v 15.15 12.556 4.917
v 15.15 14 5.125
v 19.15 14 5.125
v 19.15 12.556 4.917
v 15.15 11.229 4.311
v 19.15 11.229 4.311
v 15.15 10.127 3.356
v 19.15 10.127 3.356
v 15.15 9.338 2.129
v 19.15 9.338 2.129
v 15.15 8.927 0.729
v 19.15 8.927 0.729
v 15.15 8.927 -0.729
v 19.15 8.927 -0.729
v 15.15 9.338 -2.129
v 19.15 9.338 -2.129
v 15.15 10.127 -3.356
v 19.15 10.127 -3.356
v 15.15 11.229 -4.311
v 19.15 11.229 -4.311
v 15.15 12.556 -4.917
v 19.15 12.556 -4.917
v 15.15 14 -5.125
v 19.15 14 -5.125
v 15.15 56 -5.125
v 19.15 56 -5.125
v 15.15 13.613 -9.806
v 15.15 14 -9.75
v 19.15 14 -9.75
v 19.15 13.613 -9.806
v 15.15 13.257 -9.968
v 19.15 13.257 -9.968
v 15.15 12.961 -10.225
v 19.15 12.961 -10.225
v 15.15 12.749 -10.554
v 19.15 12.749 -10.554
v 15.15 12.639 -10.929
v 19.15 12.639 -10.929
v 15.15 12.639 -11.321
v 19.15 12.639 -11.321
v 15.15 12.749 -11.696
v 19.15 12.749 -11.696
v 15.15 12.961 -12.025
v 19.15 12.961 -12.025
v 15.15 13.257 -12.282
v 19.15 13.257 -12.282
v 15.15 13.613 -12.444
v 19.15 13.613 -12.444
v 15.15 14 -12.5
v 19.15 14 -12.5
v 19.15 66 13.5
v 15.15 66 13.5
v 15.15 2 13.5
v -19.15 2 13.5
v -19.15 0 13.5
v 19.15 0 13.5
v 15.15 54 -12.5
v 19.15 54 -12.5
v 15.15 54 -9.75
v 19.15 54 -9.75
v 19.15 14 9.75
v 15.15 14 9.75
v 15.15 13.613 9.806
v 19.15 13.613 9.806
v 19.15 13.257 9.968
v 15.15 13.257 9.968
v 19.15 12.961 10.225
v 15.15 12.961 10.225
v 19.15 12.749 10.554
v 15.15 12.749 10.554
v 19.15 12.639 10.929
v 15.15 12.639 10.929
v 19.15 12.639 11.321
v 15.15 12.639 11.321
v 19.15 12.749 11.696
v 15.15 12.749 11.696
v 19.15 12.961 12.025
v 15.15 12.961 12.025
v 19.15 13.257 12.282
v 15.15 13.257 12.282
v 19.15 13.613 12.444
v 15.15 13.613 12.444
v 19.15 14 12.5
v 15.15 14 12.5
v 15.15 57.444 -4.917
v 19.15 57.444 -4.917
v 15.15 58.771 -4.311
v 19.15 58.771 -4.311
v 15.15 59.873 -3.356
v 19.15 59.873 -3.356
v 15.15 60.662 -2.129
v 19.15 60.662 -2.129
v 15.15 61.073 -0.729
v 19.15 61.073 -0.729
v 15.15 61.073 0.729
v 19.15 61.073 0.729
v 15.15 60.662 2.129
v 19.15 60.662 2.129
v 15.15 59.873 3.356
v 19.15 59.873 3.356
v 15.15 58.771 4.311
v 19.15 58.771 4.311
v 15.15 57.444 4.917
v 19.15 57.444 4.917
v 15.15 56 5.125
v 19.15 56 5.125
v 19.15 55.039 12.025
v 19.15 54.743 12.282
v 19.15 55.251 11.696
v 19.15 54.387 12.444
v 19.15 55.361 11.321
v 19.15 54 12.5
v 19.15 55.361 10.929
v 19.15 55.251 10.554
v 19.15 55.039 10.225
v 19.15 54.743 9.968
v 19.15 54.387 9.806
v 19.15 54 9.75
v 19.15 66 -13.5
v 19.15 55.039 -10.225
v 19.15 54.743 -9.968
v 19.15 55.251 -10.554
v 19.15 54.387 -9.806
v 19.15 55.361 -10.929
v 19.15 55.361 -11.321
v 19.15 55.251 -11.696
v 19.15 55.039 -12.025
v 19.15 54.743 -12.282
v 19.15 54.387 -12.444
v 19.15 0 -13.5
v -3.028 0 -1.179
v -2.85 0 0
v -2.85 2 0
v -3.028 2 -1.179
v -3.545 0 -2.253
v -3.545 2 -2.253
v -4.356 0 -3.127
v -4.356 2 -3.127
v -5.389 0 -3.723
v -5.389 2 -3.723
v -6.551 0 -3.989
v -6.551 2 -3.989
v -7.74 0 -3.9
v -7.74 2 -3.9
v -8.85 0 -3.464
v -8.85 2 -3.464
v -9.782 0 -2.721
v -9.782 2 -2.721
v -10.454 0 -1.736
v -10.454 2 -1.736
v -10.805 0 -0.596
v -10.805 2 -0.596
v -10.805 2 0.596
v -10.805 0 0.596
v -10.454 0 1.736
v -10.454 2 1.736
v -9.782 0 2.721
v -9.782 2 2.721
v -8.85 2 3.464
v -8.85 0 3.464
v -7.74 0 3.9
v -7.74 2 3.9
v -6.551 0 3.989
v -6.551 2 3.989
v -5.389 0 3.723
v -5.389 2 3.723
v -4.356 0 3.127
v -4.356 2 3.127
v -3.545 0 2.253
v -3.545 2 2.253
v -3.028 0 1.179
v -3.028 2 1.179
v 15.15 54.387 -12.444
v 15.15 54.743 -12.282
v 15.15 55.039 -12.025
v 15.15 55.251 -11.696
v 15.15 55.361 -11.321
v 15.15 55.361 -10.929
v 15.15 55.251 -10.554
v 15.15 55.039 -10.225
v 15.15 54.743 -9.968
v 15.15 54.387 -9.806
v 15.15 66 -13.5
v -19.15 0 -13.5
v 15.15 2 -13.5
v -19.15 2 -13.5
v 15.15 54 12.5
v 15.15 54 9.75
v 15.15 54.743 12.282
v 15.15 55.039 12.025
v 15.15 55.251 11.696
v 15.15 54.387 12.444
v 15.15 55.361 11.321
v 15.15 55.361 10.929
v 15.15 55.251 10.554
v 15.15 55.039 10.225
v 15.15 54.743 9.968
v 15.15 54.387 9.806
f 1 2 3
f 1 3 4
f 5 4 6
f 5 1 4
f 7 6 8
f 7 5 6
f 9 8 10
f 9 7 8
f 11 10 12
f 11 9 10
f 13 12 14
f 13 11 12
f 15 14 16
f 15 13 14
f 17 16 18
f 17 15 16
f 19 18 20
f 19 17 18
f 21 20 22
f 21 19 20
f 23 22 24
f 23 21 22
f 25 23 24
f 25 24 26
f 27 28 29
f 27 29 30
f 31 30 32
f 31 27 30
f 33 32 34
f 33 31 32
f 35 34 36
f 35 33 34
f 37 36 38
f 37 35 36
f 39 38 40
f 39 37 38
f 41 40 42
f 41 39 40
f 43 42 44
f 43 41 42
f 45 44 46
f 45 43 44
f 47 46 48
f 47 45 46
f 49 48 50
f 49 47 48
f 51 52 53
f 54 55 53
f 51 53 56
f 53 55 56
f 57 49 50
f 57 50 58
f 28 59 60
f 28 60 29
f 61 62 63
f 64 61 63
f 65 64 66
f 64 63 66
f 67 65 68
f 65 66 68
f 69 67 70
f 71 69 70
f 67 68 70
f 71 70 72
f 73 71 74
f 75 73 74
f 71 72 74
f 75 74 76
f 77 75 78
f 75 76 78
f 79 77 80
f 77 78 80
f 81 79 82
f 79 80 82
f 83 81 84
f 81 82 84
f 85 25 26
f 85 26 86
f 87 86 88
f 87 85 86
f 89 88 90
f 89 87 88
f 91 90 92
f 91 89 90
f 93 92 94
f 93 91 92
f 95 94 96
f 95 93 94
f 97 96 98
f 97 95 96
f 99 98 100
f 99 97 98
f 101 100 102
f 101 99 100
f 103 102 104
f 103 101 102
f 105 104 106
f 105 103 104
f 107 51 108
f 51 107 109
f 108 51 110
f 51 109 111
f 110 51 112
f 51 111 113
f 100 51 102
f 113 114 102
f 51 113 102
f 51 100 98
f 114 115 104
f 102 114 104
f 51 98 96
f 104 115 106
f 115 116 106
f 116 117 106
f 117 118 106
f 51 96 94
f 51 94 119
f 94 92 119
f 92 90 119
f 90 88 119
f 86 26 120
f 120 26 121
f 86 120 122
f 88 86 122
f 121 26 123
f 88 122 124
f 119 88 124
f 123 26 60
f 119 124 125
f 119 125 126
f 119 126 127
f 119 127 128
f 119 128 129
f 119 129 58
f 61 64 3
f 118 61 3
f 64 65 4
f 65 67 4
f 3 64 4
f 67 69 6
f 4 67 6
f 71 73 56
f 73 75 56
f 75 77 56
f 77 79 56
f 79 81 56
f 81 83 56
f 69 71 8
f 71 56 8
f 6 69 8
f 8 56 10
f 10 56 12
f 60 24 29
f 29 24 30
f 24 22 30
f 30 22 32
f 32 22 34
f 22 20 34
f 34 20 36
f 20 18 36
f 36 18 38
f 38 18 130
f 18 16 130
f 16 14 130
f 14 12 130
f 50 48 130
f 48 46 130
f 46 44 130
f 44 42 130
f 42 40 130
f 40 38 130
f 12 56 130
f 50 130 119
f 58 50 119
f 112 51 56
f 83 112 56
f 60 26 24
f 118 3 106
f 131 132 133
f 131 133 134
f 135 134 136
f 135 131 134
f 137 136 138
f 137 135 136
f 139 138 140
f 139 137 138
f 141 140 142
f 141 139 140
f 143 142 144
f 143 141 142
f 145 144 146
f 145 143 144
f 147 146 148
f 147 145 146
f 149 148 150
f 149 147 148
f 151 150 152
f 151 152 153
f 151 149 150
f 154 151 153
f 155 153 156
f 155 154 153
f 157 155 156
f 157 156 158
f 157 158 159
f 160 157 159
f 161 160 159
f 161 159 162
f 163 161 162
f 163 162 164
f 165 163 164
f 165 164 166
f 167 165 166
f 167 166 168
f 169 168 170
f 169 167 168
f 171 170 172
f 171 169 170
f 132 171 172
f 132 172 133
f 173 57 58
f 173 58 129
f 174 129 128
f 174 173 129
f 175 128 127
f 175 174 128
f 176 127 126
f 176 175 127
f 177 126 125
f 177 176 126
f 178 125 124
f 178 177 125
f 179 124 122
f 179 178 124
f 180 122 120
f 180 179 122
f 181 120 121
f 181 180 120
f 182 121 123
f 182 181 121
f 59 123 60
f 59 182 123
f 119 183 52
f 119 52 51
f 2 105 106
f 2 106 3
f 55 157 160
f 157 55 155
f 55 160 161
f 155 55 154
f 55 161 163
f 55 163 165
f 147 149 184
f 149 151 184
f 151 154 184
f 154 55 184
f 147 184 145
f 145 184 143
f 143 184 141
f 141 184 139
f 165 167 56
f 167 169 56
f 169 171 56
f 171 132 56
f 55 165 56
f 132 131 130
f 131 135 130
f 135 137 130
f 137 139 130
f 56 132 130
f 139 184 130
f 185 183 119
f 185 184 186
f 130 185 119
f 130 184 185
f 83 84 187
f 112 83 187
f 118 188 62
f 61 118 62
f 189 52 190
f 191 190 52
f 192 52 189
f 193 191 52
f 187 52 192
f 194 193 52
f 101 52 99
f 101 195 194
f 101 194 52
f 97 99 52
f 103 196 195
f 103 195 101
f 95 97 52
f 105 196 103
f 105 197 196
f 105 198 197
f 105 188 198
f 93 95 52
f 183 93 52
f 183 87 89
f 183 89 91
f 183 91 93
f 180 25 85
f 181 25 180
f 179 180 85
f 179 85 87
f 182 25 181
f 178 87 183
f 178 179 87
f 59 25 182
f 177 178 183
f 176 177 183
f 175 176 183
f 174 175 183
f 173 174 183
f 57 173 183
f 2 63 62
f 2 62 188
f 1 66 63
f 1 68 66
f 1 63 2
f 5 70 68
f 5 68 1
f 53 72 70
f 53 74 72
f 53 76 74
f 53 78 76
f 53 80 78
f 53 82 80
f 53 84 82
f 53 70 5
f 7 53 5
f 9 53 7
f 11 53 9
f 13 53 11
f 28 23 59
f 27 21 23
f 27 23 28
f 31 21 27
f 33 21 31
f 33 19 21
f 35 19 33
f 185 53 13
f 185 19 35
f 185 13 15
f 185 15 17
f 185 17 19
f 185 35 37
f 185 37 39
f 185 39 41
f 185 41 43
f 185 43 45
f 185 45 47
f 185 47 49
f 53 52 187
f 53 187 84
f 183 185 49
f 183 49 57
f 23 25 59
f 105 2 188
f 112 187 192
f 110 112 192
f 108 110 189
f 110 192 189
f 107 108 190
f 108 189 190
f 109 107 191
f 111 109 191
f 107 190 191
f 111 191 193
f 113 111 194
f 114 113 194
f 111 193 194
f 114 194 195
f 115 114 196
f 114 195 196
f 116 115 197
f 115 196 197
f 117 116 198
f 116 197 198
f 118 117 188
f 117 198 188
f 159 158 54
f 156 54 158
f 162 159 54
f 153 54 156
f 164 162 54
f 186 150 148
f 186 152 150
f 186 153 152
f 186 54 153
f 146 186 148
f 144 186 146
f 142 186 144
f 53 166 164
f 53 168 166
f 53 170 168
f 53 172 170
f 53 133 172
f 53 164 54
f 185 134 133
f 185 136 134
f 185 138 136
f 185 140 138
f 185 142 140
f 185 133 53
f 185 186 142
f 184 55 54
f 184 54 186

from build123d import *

# Parameters (mm, degrees)
SKETCH1_W           = 38.3
SKETCH1_H           = 27
SKETCH1_R           = 4
BOSS_EXTRUDE1_DEPTH = 2
SKETCH2_W           = 4
SKETCH2_H           = 27
BOSS_EXTRUDE2_DEPTH = 64
CUT_EXTRUDE1_REACH  = 6


with BuildPart() as part:
    # Sketch1 → Boss-Extrude1 (new body)
    with BuildSketch(Plane(origin=(0, 0, 0), x_dir=(1, 0, 0), z_dir=(0, 1, 0))):
        Rectangle(SKETCH1_W, SKETCH1_H)
        with Locations((-6.85, 0)):
            Circle(SKETCH1_R, mode=Mode.SUBTRACT)
    extrude(amount=BOSS_EXTRUDE1_DEPTH)

    # Sketch2 → Boss-Extrude2 (add)
    with BuildSketch(Plane(origin=(0, 2, 0), x_dir=(1, 0, 0), z_dir=(0, 1, 0))):
        with Locations((17.15, 0)):
            Rectangle(SKETCH2_W, SKETCH2_H)
    extrude(amount=BOSS_EXTRUDE2_DEPTH)

    # Sketch3 → Cut-Extrude1 (cut, up to next)
    with BuildSketch(Plane.ZY.offset(-15.15), mode=Mode.PRIVATE) as cut_extrude1_sk1:
        with BuildLine():
            Line((-12.5, 14), (-12.5, 54))
            ThreePointArc((-12.5, 54), (-11.125, 55.375), (-9.75, 54))
            Line((-9.75, 54), (-9.75, 14))
            ThreePointArc((-9.75, 14), (-11.125, 12.625), (-12.5, 14))
        make_face()
    cut_extrude1_tool1 = extrude(cut_extrude1_sk1.sketch, amount=-CUT_EXTRUDE1_REACH, mode=Mode.PRIVATE) & part.part
    add(cut_extrude1_tool1.solids().sort_by_distance((15.15, 34, -11.125))[0], mode=Mode.SUBTRACT)
    # Sketch3 → Cut-Extrude1 (cut, up to next)
    with BuildSketch(Plane.ZY.offset(-15.15), mode=Mode.PRIVATE) as cut_extrude1_sk2:
        with BuildLine():
            Line((12.5, 14), (12.5, 54))
            ThreePointArc((12.5, 54), (11.125, 55.375), (9.75, 54))
            Line((9.75, 54), (9.75, 14))
            ThreePointArc((9.75, 14), (11.125, 12.625), (12.5, 14))
        make_face()
    cut_extrude1_tool2 = extrude(cut_extrude1_sk2.sketch, amount=-CUT_EXTRUDE1_REACH, mode=Mode.PRIVATE) & part.part
    add(cut_extrude1_tool2.solids().sort_by_distance((15.15, 34, 11.125))[0], mode=Mode.SUBTRACT)
    # Sketch3 → Cut-Extrude1 (cut, up to next)
    with BuildSketch(Plane.ZY.offset(-15.15), mode=Mode.PRIVATE) as cut_extrude1_sk3:
        with BuildLine():
            Line((-5.125, 14), (-5.125, 56))
            ThreePointArc((-5.125, 56), (0, 61.125), (5.125, 56))
            Line((5.125, 56), (5.125, 14))
            ThreePointArc((5.125, 14), (0, 8.875), (-5.125, 14))
        make_face()
    cut_extrude1_tool3 = extrude(cut_extrude1_sk3.sketch, amount=-CUT_EXTRUDE1_REACH, mode=Mode.PRIVATE) & part.part
    add(cut_extrude1_tool3.solids().sort_by_distance((15.15, 35, 0))[0], mode=Mode.SUBTRACT)


solid = part.part
